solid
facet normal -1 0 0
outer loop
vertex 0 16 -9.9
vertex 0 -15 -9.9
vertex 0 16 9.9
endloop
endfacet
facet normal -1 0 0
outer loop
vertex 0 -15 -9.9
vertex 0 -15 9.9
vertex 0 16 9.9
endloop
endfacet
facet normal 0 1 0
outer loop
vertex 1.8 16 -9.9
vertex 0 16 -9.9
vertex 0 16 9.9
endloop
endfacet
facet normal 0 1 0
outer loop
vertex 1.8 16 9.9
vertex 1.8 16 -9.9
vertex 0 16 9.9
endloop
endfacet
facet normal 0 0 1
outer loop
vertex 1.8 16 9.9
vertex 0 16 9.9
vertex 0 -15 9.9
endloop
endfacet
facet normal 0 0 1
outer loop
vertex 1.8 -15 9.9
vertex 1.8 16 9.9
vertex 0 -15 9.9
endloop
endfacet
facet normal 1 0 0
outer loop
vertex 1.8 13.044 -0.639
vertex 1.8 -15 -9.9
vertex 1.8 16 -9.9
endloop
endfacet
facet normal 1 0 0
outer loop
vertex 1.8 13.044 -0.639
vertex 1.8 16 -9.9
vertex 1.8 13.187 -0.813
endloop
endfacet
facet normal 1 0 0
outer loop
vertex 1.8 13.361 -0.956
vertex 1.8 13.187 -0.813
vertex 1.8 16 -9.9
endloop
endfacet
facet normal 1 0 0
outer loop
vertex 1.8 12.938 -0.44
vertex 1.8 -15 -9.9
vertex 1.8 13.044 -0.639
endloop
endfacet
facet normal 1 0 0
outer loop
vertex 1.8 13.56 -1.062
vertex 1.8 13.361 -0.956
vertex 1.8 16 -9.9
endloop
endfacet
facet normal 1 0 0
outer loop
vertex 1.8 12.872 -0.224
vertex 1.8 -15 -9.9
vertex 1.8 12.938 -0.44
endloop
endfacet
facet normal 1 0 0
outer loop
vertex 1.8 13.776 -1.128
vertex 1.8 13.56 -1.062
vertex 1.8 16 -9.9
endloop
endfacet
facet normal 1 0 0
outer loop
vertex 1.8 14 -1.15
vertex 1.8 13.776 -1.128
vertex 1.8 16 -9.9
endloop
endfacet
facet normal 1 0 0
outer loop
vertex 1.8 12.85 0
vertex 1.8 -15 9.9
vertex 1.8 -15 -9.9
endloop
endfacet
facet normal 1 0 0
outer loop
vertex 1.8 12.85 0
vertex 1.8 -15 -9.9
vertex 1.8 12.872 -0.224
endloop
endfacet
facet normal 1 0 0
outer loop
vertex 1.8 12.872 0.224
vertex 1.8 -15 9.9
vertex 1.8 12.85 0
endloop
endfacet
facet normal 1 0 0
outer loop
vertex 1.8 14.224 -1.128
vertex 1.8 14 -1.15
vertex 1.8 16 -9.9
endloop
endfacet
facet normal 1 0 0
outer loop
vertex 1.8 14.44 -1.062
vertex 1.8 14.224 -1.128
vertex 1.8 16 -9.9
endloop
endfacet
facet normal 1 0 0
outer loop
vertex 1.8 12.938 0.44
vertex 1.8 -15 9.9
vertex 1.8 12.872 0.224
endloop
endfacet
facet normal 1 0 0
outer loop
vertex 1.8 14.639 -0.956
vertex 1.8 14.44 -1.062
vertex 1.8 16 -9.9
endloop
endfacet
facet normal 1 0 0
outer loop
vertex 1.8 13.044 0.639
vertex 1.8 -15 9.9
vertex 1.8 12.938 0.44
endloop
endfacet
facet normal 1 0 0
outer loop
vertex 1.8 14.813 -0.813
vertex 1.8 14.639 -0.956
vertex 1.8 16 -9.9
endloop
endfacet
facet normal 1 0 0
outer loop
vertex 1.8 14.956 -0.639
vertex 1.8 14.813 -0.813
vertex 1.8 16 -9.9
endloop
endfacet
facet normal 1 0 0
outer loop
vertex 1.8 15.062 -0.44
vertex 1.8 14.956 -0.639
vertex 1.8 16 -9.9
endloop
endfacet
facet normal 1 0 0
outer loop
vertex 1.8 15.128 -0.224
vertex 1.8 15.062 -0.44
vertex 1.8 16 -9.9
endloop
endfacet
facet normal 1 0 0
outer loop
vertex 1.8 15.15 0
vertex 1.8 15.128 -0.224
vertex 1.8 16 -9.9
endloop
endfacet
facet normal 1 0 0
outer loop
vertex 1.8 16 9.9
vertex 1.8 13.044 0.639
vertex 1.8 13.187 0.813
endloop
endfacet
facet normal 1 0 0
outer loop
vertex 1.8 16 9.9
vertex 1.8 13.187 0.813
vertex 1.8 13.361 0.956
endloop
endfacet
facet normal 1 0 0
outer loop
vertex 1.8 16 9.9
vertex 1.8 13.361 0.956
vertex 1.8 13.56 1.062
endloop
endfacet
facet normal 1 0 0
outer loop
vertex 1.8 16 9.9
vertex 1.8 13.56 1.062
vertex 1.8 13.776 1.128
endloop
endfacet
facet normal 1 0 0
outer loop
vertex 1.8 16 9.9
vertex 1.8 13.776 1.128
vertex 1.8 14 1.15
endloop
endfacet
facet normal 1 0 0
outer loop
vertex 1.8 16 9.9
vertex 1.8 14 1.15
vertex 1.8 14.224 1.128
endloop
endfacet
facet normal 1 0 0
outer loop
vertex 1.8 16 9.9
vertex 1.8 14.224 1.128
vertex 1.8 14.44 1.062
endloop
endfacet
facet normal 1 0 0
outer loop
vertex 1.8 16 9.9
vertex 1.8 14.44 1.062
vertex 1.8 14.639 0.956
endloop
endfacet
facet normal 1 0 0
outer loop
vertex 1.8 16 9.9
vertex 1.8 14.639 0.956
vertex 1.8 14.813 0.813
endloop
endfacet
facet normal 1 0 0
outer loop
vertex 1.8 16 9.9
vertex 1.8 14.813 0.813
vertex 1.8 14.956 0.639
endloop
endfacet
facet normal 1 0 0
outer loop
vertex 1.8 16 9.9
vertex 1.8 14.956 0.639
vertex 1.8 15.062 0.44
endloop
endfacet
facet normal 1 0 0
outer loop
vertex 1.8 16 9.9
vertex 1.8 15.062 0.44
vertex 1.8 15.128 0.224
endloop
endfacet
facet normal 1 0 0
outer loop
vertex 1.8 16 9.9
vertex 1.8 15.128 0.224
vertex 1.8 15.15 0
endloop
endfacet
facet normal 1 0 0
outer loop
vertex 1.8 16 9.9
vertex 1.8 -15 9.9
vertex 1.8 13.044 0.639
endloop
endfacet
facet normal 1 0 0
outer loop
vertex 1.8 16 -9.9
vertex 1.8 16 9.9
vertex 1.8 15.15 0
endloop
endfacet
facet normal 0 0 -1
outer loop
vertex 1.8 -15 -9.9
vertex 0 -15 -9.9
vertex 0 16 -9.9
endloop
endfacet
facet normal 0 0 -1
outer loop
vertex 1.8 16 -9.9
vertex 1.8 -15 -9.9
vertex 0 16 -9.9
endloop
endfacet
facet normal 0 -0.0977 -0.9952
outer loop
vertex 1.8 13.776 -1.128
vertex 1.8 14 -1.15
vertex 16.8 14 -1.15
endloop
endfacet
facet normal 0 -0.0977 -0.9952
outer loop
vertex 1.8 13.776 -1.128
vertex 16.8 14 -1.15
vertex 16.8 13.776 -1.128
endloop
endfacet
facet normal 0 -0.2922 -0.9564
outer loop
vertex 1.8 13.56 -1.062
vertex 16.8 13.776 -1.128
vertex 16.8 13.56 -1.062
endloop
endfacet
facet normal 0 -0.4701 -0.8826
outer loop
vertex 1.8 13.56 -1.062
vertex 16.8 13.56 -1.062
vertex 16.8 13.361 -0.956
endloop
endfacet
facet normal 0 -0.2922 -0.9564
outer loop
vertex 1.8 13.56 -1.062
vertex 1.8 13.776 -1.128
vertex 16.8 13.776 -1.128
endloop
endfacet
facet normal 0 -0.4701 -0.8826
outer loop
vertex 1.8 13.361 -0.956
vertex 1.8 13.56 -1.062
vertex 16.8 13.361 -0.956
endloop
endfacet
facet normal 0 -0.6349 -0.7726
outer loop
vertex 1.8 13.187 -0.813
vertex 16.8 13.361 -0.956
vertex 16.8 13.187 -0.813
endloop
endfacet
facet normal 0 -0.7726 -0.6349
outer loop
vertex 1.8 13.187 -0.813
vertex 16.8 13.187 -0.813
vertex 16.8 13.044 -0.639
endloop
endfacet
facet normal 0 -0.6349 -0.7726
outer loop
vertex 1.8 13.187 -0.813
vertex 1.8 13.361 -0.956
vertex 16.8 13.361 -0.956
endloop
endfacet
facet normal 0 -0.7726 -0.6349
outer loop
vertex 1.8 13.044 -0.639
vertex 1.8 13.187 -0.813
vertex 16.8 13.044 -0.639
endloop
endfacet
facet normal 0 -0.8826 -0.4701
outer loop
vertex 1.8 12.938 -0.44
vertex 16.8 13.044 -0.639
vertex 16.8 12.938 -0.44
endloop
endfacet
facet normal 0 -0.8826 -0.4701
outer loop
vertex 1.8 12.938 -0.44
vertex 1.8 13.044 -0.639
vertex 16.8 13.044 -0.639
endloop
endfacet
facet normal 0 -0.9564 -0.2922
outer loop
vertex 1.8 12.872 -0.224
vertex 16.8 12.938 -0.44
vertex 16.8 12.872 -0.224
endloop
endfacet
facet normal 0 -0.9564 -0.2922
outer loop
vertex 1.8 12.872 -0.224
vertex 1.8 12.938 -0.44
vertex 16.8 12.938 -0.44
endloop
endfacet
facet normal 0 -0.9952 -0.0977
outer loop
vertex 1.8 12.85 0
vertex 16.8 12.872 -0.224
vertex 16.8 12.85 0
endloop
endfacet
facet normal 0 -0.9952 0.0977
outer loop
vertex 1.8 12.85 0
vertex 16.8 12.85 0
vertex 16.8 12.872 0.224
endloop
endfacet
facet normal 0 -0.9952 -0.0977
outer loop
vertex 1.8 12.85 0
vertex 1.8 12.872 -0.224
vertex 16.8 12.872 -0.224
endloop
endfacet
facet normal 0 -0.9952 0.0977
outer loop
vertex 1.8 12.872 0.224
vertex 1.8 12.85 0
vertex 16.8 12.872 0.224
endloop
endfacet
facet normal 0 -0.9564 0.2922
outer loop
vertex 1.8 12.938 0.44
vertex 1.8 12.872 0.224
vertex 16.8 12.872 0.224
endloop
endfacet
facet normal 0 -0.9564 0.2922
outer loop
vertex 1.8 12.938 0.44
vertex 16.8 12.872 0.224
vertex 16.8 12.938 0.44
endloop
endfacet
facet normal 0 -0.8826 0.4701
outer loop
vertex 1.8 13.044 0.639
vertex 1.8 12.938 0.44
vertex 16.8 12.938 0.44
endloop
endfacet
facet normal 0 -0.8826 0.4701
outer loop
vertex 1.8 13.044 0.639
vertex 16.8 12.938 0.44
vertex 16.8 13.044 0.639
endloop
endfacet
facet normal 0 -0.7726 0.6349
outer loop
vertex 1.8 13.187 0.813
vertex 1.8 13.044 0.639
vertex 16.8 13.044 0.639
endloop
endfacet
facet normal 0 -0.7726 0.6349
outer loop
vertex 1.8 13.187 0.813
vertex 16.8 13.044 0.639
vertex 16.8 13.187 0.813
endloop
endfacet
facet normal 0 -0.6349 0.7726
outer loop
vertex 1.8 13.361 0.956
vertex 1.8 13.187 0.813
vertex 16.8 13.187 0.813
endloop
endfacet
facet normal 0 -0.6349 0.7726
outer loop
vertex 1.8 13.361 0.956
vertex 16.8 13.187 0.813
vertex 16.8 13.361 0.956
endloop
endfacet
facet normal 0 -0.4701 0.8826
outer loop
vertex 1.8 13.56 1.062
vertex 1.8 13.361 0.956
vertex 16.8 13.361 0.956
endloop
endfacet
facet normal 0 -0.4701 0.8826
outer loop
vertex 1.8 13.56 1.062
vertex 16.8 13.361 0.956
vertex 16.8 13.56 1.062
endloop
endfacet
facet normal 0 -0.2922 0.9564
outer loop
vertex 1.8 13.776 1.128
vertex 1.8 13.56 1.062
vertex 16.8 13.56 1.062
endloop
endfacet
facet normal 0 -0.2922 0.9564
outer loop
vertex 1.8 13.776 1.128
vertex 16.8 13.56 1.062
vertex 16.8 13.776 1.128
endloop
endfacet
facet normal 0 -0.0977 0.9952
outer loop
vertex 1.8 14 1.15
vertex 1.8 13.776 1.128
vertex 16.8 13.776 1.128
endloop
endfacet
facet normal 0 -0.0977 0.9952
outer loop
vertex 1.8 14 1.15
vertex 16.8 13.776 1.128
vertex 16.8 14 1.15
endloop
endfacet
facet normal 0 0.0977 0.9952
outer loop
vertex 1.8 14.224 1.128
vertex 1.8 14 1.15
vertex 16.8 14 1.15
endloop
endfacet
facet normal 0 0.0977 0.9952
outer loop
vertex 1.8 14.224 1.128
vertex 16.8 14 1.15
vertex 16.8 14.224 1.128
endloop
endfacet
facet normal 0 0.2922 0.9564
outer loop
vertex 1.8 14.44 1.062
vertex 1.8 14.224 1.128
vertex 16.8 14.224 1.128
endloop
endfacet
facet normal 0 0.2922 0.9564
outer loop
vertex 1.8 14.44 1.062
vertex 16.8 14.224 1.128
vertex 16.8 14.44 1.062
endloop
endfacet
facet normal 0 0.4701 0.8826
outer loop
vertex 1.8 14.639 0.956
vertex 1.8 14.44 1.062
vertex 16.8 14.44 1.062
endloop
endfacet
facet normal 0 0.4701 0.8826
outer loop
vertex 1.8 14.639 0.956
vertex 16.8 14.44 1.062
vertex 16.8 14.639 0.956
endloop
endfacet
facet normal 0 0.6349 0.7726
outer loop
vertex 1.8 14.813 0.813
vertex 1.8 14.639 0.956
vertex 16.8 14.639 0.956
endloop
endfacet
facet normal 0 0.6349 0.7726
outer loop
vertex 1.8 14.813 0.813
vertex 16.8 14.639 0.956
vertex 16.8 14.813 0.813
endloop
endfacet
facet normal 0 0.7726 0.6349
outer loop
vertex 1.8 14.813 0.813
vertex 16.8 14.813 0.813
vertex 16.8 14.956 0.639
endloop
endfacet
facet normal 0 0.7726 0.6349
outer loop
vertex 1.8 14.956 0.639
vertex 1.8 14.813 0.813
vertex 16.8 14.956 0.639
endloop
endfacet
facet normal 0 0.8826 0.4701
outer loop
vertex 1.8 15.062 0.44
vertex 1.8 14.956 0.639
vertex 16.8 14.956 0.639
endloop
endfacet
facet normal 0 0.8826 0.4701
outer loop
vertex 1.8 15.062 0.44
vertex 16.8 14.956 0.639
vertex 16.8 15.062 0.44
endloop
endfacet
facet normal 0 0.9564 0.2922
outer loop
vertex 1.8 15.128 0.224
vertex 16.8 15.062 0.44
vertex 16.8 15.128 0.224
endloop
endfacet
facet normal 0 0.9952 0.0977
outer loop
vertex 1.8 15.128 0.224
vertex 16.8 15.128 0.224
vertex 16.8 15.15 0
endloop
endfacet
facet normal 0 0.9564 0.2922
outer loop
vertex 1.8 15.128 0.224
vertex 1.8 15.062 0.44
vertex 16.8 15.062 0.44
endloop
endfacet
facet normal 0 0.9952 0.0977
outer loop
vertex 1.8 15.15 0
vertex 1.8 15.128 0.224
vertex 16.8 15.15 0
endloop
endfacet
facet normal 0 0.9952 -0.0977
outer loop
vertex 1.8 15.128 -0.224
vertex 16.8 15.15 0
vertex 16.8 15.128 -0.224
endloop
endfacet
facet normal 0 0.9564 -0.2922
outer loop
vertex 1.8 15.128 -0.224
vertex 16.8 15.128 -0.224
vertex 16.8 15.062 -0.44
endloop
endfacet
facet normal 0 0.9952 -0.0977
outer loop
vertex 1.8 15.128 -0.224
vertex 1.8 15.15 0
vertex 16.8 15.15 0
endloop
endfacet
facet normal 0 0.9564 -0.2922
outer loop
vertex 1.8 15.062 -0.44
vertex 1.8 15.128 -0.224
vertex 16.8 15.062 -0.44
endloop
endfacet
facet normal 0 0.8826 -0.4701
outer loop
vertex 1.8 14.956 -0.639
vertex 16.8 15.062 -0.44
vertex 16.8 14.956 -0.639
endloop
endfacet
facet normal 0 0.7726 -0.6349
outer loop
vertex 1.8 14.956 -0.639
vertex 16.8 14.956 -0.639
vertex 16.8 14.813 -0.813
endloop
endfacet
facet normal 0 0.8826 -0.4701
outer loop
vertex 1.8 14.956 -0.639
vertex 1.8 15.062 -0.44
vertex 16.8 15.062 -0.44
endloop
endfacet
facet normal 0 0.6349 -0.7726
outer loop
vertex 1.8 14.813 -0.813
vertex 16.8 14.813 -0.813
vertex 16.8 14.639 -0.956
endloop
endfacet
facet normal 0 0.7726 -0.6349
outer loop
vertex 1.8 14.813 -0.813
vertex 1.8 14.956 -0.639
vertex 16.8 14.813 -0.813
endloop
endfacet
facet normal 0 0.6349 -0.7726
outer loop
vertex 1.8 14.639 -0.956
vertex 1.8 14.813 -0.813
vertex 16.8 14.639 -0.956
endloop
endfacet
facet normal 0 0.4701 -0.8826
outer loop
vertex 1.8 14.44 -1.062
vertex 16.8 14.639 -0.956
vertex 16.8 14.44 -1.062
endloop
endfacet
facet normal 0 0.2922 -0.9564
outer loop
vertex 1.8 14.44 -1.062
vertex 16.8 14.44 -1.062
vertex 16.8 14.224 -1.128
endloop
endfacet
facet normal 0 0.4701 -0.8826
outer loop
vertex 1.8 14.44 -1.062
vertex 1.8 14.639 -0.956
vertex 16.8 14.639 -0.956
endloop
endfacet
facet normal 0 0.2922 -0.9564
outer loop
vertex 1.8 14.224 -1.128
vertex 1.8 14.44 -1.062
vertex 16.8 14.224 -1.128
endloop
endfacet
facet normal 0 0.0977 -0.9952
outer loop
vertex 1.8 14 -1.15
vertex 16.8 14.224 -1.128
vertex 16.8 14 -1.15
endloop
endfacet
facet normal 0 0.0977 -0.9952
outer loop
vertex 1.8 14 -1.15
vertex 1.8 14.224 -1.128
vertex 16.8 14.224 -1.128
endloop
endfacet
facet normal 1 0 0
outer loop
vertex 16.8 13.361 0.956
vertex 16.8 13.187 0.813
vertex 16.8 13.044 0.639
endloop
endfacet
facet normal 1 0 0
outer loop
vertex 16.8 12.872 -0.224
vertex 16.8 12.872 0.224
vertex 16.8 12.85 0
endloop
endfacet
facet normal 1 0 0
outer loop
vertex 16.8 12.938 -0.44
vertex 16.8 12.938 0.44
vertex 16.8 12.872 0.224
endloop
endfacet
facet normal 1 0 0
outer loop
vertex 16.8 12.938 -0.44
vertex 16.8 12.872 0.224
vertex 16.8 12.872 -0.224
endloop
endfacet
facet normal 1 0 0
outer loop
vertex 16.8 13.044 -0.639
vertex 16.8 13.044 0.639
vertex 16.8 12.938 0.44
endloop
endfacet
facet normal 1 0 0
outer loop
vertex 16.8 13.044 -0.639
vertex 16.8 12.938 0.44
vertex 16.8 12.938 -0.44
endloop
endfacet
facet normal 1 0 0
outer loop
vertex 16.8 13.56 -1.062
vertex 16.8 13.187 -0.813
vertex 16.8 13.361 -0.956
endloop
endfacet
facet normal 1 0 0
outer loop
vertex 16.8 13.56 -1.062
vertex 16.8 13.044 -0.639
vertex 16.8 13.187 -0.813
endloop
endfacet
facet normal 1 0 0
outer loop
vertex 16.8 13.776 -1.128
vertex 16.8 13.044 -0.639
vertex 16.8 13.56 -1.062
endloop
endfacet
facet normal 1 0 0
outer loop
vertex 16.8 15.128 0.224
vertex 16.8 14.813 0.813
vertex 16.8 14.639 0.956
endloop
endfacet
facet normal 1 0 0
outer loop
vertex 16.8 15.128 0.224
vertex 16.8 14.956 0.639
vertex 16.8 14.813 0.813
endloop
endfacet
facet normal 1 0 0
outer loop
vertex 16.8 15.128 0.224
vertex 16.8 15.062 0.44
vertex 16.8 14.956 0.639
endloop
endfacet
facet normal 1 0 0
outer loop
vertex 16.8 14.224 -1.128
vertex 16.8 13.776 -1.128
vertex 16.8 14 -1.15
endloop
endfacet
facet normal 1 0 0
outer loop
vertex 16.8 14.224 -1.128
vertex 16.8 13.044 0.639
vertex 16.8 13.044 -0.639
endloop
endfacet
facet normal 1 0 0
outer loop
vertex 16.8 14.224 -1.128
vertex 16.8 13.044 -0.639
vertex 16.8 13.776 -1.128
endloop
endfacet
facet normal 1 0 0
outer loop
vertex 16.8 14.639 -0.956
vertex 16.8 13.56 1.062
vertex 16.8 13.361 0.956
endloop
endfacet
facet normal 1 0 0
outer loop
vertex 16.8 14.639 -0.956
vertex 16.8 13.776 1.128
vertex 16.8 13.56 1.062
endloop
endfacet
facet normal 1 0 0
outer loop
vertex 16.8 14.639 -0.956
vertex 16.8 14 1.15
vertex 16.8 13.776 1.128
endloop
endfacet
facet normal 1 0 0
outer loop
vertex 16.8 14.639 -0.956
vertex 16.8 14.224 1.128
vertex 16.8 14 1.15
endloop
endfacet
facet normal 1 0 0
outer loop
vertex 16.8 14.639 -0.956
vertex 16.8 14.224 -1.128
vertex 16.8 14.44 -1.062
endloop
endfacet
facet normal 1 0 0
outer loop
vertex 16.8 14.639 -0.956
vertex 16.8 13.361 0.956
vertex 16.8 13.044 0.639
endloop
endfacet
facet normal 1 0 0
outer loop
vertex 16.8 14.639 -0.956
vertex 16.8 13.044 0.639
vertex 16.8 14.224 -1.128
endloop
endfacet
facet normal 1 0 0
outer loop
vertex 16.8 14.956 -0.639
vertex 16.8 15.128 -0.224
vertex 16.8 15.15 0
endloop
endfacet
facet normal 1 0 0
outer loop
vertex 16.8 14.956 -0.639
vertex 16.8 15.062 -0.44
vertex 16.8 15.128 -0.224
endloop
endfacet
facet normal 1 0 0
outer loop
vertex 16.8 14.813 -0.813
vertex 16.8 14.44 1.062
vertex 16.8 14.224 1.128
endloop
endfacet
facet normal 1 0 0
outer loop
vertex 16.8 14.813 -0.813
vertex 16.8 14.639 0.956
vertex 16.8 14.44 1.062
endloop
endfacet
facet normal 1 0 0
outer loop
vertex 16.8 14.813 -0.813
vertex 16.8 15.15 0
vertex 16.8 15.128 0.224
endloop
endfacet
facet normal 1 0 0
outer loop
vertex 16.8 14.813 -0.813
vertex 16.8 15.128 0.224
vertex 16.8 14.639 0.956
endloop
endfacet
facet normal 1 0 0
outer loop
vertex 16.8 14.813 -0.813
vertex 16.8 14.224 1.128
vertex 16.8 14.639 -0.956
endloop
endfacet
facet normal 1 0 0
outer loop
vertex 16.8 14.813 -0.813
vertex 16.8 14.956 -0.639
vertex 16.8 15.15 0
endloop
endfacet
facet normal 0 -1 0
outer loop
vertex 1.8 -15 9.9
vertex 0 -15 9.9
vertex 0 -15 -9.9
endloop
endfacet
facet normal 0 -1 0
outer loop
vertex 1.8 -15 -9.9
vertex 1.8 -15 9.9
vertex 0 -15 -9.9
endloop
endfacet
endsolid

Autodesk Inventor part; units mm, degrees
ref_plane "YZ Plane" through (0, 0, 0) normal (1, 0, 0) x (0, 1, 0)
ref_plane "XZ Plane" through (0, 0, 0) normal (0, 1, 0) x (-1, 0, 0)
ref_plane "XY Plane" through (0, 0, 0) normal (0, 0, 1) x (1, 0, 0)
sketch "Sketch1" plane through (0, 0, 0) normal (1, 0, 0) x (0, 1, 0)
  line L0 (20, 9.9) -> (-20, 9.9)
  line L1 (-20, 9.9) -> (-20, -9.9)
  line L2 (-20, -9.9) -> (20, -9.9)
  line L3 (20, -9.9) -> (20, 9.9)
  point P0 (0, 0)
  point P1 (0, 9.9)
  point P2 (-20, 0)
  dimension "d0" = 19.8
  dimension "d1" = 40
extrude "Extrusion1" add sketch "Sketch1" along normal blind 1.8
sketch "Sketch2" plane through (1.8, 0, 0) normal (1, 0, 0) x (0, 0, -1)
  circle A0 centre (0, 14) radius 1.15
  line L0 (-9.9, -20) -> (9.9, -20) projected
  point P0 (0, 0)
  dimension "d4" = 2.3
  dimension "d5" = 34
extrude "Extrusion2" add sketch "Sketch2" along normal blind 10
thicken "Thicken1" operation add thickness 10 both sides no extend neighbours yes toward (0, 1, 0) faces at (0.6, -20, 3.3)
thicken "Thicken2" operation add thickness 5 both sides no extend neighbours yes toward (0, -1, 0) faces at (0.6, -10, 3.3)
thicken "Thicken3" operation add thickness 2 both sides no extend neighbours yes toward (0, 1, 0) faces at (0.6, -15, 3.3)
thicken "Thicken4" operation add thickness 4 both sides no extend neighbours yes toward (0, -1, 0) faces at (0.6, 20, -3.3)
thicken "Thicken5" operation add thickness 2 both sides no extend neighbours yes toward (0, -1, 0) faces at (0.6, -13, 3.3)
thicken "Thicken6" operation add thickness 5 both sides no extend neighbours yes toward (1, 0, 0) faces at (11.8, 13.5623, 0.2869)
properties part number "sample-transfer_slider"
